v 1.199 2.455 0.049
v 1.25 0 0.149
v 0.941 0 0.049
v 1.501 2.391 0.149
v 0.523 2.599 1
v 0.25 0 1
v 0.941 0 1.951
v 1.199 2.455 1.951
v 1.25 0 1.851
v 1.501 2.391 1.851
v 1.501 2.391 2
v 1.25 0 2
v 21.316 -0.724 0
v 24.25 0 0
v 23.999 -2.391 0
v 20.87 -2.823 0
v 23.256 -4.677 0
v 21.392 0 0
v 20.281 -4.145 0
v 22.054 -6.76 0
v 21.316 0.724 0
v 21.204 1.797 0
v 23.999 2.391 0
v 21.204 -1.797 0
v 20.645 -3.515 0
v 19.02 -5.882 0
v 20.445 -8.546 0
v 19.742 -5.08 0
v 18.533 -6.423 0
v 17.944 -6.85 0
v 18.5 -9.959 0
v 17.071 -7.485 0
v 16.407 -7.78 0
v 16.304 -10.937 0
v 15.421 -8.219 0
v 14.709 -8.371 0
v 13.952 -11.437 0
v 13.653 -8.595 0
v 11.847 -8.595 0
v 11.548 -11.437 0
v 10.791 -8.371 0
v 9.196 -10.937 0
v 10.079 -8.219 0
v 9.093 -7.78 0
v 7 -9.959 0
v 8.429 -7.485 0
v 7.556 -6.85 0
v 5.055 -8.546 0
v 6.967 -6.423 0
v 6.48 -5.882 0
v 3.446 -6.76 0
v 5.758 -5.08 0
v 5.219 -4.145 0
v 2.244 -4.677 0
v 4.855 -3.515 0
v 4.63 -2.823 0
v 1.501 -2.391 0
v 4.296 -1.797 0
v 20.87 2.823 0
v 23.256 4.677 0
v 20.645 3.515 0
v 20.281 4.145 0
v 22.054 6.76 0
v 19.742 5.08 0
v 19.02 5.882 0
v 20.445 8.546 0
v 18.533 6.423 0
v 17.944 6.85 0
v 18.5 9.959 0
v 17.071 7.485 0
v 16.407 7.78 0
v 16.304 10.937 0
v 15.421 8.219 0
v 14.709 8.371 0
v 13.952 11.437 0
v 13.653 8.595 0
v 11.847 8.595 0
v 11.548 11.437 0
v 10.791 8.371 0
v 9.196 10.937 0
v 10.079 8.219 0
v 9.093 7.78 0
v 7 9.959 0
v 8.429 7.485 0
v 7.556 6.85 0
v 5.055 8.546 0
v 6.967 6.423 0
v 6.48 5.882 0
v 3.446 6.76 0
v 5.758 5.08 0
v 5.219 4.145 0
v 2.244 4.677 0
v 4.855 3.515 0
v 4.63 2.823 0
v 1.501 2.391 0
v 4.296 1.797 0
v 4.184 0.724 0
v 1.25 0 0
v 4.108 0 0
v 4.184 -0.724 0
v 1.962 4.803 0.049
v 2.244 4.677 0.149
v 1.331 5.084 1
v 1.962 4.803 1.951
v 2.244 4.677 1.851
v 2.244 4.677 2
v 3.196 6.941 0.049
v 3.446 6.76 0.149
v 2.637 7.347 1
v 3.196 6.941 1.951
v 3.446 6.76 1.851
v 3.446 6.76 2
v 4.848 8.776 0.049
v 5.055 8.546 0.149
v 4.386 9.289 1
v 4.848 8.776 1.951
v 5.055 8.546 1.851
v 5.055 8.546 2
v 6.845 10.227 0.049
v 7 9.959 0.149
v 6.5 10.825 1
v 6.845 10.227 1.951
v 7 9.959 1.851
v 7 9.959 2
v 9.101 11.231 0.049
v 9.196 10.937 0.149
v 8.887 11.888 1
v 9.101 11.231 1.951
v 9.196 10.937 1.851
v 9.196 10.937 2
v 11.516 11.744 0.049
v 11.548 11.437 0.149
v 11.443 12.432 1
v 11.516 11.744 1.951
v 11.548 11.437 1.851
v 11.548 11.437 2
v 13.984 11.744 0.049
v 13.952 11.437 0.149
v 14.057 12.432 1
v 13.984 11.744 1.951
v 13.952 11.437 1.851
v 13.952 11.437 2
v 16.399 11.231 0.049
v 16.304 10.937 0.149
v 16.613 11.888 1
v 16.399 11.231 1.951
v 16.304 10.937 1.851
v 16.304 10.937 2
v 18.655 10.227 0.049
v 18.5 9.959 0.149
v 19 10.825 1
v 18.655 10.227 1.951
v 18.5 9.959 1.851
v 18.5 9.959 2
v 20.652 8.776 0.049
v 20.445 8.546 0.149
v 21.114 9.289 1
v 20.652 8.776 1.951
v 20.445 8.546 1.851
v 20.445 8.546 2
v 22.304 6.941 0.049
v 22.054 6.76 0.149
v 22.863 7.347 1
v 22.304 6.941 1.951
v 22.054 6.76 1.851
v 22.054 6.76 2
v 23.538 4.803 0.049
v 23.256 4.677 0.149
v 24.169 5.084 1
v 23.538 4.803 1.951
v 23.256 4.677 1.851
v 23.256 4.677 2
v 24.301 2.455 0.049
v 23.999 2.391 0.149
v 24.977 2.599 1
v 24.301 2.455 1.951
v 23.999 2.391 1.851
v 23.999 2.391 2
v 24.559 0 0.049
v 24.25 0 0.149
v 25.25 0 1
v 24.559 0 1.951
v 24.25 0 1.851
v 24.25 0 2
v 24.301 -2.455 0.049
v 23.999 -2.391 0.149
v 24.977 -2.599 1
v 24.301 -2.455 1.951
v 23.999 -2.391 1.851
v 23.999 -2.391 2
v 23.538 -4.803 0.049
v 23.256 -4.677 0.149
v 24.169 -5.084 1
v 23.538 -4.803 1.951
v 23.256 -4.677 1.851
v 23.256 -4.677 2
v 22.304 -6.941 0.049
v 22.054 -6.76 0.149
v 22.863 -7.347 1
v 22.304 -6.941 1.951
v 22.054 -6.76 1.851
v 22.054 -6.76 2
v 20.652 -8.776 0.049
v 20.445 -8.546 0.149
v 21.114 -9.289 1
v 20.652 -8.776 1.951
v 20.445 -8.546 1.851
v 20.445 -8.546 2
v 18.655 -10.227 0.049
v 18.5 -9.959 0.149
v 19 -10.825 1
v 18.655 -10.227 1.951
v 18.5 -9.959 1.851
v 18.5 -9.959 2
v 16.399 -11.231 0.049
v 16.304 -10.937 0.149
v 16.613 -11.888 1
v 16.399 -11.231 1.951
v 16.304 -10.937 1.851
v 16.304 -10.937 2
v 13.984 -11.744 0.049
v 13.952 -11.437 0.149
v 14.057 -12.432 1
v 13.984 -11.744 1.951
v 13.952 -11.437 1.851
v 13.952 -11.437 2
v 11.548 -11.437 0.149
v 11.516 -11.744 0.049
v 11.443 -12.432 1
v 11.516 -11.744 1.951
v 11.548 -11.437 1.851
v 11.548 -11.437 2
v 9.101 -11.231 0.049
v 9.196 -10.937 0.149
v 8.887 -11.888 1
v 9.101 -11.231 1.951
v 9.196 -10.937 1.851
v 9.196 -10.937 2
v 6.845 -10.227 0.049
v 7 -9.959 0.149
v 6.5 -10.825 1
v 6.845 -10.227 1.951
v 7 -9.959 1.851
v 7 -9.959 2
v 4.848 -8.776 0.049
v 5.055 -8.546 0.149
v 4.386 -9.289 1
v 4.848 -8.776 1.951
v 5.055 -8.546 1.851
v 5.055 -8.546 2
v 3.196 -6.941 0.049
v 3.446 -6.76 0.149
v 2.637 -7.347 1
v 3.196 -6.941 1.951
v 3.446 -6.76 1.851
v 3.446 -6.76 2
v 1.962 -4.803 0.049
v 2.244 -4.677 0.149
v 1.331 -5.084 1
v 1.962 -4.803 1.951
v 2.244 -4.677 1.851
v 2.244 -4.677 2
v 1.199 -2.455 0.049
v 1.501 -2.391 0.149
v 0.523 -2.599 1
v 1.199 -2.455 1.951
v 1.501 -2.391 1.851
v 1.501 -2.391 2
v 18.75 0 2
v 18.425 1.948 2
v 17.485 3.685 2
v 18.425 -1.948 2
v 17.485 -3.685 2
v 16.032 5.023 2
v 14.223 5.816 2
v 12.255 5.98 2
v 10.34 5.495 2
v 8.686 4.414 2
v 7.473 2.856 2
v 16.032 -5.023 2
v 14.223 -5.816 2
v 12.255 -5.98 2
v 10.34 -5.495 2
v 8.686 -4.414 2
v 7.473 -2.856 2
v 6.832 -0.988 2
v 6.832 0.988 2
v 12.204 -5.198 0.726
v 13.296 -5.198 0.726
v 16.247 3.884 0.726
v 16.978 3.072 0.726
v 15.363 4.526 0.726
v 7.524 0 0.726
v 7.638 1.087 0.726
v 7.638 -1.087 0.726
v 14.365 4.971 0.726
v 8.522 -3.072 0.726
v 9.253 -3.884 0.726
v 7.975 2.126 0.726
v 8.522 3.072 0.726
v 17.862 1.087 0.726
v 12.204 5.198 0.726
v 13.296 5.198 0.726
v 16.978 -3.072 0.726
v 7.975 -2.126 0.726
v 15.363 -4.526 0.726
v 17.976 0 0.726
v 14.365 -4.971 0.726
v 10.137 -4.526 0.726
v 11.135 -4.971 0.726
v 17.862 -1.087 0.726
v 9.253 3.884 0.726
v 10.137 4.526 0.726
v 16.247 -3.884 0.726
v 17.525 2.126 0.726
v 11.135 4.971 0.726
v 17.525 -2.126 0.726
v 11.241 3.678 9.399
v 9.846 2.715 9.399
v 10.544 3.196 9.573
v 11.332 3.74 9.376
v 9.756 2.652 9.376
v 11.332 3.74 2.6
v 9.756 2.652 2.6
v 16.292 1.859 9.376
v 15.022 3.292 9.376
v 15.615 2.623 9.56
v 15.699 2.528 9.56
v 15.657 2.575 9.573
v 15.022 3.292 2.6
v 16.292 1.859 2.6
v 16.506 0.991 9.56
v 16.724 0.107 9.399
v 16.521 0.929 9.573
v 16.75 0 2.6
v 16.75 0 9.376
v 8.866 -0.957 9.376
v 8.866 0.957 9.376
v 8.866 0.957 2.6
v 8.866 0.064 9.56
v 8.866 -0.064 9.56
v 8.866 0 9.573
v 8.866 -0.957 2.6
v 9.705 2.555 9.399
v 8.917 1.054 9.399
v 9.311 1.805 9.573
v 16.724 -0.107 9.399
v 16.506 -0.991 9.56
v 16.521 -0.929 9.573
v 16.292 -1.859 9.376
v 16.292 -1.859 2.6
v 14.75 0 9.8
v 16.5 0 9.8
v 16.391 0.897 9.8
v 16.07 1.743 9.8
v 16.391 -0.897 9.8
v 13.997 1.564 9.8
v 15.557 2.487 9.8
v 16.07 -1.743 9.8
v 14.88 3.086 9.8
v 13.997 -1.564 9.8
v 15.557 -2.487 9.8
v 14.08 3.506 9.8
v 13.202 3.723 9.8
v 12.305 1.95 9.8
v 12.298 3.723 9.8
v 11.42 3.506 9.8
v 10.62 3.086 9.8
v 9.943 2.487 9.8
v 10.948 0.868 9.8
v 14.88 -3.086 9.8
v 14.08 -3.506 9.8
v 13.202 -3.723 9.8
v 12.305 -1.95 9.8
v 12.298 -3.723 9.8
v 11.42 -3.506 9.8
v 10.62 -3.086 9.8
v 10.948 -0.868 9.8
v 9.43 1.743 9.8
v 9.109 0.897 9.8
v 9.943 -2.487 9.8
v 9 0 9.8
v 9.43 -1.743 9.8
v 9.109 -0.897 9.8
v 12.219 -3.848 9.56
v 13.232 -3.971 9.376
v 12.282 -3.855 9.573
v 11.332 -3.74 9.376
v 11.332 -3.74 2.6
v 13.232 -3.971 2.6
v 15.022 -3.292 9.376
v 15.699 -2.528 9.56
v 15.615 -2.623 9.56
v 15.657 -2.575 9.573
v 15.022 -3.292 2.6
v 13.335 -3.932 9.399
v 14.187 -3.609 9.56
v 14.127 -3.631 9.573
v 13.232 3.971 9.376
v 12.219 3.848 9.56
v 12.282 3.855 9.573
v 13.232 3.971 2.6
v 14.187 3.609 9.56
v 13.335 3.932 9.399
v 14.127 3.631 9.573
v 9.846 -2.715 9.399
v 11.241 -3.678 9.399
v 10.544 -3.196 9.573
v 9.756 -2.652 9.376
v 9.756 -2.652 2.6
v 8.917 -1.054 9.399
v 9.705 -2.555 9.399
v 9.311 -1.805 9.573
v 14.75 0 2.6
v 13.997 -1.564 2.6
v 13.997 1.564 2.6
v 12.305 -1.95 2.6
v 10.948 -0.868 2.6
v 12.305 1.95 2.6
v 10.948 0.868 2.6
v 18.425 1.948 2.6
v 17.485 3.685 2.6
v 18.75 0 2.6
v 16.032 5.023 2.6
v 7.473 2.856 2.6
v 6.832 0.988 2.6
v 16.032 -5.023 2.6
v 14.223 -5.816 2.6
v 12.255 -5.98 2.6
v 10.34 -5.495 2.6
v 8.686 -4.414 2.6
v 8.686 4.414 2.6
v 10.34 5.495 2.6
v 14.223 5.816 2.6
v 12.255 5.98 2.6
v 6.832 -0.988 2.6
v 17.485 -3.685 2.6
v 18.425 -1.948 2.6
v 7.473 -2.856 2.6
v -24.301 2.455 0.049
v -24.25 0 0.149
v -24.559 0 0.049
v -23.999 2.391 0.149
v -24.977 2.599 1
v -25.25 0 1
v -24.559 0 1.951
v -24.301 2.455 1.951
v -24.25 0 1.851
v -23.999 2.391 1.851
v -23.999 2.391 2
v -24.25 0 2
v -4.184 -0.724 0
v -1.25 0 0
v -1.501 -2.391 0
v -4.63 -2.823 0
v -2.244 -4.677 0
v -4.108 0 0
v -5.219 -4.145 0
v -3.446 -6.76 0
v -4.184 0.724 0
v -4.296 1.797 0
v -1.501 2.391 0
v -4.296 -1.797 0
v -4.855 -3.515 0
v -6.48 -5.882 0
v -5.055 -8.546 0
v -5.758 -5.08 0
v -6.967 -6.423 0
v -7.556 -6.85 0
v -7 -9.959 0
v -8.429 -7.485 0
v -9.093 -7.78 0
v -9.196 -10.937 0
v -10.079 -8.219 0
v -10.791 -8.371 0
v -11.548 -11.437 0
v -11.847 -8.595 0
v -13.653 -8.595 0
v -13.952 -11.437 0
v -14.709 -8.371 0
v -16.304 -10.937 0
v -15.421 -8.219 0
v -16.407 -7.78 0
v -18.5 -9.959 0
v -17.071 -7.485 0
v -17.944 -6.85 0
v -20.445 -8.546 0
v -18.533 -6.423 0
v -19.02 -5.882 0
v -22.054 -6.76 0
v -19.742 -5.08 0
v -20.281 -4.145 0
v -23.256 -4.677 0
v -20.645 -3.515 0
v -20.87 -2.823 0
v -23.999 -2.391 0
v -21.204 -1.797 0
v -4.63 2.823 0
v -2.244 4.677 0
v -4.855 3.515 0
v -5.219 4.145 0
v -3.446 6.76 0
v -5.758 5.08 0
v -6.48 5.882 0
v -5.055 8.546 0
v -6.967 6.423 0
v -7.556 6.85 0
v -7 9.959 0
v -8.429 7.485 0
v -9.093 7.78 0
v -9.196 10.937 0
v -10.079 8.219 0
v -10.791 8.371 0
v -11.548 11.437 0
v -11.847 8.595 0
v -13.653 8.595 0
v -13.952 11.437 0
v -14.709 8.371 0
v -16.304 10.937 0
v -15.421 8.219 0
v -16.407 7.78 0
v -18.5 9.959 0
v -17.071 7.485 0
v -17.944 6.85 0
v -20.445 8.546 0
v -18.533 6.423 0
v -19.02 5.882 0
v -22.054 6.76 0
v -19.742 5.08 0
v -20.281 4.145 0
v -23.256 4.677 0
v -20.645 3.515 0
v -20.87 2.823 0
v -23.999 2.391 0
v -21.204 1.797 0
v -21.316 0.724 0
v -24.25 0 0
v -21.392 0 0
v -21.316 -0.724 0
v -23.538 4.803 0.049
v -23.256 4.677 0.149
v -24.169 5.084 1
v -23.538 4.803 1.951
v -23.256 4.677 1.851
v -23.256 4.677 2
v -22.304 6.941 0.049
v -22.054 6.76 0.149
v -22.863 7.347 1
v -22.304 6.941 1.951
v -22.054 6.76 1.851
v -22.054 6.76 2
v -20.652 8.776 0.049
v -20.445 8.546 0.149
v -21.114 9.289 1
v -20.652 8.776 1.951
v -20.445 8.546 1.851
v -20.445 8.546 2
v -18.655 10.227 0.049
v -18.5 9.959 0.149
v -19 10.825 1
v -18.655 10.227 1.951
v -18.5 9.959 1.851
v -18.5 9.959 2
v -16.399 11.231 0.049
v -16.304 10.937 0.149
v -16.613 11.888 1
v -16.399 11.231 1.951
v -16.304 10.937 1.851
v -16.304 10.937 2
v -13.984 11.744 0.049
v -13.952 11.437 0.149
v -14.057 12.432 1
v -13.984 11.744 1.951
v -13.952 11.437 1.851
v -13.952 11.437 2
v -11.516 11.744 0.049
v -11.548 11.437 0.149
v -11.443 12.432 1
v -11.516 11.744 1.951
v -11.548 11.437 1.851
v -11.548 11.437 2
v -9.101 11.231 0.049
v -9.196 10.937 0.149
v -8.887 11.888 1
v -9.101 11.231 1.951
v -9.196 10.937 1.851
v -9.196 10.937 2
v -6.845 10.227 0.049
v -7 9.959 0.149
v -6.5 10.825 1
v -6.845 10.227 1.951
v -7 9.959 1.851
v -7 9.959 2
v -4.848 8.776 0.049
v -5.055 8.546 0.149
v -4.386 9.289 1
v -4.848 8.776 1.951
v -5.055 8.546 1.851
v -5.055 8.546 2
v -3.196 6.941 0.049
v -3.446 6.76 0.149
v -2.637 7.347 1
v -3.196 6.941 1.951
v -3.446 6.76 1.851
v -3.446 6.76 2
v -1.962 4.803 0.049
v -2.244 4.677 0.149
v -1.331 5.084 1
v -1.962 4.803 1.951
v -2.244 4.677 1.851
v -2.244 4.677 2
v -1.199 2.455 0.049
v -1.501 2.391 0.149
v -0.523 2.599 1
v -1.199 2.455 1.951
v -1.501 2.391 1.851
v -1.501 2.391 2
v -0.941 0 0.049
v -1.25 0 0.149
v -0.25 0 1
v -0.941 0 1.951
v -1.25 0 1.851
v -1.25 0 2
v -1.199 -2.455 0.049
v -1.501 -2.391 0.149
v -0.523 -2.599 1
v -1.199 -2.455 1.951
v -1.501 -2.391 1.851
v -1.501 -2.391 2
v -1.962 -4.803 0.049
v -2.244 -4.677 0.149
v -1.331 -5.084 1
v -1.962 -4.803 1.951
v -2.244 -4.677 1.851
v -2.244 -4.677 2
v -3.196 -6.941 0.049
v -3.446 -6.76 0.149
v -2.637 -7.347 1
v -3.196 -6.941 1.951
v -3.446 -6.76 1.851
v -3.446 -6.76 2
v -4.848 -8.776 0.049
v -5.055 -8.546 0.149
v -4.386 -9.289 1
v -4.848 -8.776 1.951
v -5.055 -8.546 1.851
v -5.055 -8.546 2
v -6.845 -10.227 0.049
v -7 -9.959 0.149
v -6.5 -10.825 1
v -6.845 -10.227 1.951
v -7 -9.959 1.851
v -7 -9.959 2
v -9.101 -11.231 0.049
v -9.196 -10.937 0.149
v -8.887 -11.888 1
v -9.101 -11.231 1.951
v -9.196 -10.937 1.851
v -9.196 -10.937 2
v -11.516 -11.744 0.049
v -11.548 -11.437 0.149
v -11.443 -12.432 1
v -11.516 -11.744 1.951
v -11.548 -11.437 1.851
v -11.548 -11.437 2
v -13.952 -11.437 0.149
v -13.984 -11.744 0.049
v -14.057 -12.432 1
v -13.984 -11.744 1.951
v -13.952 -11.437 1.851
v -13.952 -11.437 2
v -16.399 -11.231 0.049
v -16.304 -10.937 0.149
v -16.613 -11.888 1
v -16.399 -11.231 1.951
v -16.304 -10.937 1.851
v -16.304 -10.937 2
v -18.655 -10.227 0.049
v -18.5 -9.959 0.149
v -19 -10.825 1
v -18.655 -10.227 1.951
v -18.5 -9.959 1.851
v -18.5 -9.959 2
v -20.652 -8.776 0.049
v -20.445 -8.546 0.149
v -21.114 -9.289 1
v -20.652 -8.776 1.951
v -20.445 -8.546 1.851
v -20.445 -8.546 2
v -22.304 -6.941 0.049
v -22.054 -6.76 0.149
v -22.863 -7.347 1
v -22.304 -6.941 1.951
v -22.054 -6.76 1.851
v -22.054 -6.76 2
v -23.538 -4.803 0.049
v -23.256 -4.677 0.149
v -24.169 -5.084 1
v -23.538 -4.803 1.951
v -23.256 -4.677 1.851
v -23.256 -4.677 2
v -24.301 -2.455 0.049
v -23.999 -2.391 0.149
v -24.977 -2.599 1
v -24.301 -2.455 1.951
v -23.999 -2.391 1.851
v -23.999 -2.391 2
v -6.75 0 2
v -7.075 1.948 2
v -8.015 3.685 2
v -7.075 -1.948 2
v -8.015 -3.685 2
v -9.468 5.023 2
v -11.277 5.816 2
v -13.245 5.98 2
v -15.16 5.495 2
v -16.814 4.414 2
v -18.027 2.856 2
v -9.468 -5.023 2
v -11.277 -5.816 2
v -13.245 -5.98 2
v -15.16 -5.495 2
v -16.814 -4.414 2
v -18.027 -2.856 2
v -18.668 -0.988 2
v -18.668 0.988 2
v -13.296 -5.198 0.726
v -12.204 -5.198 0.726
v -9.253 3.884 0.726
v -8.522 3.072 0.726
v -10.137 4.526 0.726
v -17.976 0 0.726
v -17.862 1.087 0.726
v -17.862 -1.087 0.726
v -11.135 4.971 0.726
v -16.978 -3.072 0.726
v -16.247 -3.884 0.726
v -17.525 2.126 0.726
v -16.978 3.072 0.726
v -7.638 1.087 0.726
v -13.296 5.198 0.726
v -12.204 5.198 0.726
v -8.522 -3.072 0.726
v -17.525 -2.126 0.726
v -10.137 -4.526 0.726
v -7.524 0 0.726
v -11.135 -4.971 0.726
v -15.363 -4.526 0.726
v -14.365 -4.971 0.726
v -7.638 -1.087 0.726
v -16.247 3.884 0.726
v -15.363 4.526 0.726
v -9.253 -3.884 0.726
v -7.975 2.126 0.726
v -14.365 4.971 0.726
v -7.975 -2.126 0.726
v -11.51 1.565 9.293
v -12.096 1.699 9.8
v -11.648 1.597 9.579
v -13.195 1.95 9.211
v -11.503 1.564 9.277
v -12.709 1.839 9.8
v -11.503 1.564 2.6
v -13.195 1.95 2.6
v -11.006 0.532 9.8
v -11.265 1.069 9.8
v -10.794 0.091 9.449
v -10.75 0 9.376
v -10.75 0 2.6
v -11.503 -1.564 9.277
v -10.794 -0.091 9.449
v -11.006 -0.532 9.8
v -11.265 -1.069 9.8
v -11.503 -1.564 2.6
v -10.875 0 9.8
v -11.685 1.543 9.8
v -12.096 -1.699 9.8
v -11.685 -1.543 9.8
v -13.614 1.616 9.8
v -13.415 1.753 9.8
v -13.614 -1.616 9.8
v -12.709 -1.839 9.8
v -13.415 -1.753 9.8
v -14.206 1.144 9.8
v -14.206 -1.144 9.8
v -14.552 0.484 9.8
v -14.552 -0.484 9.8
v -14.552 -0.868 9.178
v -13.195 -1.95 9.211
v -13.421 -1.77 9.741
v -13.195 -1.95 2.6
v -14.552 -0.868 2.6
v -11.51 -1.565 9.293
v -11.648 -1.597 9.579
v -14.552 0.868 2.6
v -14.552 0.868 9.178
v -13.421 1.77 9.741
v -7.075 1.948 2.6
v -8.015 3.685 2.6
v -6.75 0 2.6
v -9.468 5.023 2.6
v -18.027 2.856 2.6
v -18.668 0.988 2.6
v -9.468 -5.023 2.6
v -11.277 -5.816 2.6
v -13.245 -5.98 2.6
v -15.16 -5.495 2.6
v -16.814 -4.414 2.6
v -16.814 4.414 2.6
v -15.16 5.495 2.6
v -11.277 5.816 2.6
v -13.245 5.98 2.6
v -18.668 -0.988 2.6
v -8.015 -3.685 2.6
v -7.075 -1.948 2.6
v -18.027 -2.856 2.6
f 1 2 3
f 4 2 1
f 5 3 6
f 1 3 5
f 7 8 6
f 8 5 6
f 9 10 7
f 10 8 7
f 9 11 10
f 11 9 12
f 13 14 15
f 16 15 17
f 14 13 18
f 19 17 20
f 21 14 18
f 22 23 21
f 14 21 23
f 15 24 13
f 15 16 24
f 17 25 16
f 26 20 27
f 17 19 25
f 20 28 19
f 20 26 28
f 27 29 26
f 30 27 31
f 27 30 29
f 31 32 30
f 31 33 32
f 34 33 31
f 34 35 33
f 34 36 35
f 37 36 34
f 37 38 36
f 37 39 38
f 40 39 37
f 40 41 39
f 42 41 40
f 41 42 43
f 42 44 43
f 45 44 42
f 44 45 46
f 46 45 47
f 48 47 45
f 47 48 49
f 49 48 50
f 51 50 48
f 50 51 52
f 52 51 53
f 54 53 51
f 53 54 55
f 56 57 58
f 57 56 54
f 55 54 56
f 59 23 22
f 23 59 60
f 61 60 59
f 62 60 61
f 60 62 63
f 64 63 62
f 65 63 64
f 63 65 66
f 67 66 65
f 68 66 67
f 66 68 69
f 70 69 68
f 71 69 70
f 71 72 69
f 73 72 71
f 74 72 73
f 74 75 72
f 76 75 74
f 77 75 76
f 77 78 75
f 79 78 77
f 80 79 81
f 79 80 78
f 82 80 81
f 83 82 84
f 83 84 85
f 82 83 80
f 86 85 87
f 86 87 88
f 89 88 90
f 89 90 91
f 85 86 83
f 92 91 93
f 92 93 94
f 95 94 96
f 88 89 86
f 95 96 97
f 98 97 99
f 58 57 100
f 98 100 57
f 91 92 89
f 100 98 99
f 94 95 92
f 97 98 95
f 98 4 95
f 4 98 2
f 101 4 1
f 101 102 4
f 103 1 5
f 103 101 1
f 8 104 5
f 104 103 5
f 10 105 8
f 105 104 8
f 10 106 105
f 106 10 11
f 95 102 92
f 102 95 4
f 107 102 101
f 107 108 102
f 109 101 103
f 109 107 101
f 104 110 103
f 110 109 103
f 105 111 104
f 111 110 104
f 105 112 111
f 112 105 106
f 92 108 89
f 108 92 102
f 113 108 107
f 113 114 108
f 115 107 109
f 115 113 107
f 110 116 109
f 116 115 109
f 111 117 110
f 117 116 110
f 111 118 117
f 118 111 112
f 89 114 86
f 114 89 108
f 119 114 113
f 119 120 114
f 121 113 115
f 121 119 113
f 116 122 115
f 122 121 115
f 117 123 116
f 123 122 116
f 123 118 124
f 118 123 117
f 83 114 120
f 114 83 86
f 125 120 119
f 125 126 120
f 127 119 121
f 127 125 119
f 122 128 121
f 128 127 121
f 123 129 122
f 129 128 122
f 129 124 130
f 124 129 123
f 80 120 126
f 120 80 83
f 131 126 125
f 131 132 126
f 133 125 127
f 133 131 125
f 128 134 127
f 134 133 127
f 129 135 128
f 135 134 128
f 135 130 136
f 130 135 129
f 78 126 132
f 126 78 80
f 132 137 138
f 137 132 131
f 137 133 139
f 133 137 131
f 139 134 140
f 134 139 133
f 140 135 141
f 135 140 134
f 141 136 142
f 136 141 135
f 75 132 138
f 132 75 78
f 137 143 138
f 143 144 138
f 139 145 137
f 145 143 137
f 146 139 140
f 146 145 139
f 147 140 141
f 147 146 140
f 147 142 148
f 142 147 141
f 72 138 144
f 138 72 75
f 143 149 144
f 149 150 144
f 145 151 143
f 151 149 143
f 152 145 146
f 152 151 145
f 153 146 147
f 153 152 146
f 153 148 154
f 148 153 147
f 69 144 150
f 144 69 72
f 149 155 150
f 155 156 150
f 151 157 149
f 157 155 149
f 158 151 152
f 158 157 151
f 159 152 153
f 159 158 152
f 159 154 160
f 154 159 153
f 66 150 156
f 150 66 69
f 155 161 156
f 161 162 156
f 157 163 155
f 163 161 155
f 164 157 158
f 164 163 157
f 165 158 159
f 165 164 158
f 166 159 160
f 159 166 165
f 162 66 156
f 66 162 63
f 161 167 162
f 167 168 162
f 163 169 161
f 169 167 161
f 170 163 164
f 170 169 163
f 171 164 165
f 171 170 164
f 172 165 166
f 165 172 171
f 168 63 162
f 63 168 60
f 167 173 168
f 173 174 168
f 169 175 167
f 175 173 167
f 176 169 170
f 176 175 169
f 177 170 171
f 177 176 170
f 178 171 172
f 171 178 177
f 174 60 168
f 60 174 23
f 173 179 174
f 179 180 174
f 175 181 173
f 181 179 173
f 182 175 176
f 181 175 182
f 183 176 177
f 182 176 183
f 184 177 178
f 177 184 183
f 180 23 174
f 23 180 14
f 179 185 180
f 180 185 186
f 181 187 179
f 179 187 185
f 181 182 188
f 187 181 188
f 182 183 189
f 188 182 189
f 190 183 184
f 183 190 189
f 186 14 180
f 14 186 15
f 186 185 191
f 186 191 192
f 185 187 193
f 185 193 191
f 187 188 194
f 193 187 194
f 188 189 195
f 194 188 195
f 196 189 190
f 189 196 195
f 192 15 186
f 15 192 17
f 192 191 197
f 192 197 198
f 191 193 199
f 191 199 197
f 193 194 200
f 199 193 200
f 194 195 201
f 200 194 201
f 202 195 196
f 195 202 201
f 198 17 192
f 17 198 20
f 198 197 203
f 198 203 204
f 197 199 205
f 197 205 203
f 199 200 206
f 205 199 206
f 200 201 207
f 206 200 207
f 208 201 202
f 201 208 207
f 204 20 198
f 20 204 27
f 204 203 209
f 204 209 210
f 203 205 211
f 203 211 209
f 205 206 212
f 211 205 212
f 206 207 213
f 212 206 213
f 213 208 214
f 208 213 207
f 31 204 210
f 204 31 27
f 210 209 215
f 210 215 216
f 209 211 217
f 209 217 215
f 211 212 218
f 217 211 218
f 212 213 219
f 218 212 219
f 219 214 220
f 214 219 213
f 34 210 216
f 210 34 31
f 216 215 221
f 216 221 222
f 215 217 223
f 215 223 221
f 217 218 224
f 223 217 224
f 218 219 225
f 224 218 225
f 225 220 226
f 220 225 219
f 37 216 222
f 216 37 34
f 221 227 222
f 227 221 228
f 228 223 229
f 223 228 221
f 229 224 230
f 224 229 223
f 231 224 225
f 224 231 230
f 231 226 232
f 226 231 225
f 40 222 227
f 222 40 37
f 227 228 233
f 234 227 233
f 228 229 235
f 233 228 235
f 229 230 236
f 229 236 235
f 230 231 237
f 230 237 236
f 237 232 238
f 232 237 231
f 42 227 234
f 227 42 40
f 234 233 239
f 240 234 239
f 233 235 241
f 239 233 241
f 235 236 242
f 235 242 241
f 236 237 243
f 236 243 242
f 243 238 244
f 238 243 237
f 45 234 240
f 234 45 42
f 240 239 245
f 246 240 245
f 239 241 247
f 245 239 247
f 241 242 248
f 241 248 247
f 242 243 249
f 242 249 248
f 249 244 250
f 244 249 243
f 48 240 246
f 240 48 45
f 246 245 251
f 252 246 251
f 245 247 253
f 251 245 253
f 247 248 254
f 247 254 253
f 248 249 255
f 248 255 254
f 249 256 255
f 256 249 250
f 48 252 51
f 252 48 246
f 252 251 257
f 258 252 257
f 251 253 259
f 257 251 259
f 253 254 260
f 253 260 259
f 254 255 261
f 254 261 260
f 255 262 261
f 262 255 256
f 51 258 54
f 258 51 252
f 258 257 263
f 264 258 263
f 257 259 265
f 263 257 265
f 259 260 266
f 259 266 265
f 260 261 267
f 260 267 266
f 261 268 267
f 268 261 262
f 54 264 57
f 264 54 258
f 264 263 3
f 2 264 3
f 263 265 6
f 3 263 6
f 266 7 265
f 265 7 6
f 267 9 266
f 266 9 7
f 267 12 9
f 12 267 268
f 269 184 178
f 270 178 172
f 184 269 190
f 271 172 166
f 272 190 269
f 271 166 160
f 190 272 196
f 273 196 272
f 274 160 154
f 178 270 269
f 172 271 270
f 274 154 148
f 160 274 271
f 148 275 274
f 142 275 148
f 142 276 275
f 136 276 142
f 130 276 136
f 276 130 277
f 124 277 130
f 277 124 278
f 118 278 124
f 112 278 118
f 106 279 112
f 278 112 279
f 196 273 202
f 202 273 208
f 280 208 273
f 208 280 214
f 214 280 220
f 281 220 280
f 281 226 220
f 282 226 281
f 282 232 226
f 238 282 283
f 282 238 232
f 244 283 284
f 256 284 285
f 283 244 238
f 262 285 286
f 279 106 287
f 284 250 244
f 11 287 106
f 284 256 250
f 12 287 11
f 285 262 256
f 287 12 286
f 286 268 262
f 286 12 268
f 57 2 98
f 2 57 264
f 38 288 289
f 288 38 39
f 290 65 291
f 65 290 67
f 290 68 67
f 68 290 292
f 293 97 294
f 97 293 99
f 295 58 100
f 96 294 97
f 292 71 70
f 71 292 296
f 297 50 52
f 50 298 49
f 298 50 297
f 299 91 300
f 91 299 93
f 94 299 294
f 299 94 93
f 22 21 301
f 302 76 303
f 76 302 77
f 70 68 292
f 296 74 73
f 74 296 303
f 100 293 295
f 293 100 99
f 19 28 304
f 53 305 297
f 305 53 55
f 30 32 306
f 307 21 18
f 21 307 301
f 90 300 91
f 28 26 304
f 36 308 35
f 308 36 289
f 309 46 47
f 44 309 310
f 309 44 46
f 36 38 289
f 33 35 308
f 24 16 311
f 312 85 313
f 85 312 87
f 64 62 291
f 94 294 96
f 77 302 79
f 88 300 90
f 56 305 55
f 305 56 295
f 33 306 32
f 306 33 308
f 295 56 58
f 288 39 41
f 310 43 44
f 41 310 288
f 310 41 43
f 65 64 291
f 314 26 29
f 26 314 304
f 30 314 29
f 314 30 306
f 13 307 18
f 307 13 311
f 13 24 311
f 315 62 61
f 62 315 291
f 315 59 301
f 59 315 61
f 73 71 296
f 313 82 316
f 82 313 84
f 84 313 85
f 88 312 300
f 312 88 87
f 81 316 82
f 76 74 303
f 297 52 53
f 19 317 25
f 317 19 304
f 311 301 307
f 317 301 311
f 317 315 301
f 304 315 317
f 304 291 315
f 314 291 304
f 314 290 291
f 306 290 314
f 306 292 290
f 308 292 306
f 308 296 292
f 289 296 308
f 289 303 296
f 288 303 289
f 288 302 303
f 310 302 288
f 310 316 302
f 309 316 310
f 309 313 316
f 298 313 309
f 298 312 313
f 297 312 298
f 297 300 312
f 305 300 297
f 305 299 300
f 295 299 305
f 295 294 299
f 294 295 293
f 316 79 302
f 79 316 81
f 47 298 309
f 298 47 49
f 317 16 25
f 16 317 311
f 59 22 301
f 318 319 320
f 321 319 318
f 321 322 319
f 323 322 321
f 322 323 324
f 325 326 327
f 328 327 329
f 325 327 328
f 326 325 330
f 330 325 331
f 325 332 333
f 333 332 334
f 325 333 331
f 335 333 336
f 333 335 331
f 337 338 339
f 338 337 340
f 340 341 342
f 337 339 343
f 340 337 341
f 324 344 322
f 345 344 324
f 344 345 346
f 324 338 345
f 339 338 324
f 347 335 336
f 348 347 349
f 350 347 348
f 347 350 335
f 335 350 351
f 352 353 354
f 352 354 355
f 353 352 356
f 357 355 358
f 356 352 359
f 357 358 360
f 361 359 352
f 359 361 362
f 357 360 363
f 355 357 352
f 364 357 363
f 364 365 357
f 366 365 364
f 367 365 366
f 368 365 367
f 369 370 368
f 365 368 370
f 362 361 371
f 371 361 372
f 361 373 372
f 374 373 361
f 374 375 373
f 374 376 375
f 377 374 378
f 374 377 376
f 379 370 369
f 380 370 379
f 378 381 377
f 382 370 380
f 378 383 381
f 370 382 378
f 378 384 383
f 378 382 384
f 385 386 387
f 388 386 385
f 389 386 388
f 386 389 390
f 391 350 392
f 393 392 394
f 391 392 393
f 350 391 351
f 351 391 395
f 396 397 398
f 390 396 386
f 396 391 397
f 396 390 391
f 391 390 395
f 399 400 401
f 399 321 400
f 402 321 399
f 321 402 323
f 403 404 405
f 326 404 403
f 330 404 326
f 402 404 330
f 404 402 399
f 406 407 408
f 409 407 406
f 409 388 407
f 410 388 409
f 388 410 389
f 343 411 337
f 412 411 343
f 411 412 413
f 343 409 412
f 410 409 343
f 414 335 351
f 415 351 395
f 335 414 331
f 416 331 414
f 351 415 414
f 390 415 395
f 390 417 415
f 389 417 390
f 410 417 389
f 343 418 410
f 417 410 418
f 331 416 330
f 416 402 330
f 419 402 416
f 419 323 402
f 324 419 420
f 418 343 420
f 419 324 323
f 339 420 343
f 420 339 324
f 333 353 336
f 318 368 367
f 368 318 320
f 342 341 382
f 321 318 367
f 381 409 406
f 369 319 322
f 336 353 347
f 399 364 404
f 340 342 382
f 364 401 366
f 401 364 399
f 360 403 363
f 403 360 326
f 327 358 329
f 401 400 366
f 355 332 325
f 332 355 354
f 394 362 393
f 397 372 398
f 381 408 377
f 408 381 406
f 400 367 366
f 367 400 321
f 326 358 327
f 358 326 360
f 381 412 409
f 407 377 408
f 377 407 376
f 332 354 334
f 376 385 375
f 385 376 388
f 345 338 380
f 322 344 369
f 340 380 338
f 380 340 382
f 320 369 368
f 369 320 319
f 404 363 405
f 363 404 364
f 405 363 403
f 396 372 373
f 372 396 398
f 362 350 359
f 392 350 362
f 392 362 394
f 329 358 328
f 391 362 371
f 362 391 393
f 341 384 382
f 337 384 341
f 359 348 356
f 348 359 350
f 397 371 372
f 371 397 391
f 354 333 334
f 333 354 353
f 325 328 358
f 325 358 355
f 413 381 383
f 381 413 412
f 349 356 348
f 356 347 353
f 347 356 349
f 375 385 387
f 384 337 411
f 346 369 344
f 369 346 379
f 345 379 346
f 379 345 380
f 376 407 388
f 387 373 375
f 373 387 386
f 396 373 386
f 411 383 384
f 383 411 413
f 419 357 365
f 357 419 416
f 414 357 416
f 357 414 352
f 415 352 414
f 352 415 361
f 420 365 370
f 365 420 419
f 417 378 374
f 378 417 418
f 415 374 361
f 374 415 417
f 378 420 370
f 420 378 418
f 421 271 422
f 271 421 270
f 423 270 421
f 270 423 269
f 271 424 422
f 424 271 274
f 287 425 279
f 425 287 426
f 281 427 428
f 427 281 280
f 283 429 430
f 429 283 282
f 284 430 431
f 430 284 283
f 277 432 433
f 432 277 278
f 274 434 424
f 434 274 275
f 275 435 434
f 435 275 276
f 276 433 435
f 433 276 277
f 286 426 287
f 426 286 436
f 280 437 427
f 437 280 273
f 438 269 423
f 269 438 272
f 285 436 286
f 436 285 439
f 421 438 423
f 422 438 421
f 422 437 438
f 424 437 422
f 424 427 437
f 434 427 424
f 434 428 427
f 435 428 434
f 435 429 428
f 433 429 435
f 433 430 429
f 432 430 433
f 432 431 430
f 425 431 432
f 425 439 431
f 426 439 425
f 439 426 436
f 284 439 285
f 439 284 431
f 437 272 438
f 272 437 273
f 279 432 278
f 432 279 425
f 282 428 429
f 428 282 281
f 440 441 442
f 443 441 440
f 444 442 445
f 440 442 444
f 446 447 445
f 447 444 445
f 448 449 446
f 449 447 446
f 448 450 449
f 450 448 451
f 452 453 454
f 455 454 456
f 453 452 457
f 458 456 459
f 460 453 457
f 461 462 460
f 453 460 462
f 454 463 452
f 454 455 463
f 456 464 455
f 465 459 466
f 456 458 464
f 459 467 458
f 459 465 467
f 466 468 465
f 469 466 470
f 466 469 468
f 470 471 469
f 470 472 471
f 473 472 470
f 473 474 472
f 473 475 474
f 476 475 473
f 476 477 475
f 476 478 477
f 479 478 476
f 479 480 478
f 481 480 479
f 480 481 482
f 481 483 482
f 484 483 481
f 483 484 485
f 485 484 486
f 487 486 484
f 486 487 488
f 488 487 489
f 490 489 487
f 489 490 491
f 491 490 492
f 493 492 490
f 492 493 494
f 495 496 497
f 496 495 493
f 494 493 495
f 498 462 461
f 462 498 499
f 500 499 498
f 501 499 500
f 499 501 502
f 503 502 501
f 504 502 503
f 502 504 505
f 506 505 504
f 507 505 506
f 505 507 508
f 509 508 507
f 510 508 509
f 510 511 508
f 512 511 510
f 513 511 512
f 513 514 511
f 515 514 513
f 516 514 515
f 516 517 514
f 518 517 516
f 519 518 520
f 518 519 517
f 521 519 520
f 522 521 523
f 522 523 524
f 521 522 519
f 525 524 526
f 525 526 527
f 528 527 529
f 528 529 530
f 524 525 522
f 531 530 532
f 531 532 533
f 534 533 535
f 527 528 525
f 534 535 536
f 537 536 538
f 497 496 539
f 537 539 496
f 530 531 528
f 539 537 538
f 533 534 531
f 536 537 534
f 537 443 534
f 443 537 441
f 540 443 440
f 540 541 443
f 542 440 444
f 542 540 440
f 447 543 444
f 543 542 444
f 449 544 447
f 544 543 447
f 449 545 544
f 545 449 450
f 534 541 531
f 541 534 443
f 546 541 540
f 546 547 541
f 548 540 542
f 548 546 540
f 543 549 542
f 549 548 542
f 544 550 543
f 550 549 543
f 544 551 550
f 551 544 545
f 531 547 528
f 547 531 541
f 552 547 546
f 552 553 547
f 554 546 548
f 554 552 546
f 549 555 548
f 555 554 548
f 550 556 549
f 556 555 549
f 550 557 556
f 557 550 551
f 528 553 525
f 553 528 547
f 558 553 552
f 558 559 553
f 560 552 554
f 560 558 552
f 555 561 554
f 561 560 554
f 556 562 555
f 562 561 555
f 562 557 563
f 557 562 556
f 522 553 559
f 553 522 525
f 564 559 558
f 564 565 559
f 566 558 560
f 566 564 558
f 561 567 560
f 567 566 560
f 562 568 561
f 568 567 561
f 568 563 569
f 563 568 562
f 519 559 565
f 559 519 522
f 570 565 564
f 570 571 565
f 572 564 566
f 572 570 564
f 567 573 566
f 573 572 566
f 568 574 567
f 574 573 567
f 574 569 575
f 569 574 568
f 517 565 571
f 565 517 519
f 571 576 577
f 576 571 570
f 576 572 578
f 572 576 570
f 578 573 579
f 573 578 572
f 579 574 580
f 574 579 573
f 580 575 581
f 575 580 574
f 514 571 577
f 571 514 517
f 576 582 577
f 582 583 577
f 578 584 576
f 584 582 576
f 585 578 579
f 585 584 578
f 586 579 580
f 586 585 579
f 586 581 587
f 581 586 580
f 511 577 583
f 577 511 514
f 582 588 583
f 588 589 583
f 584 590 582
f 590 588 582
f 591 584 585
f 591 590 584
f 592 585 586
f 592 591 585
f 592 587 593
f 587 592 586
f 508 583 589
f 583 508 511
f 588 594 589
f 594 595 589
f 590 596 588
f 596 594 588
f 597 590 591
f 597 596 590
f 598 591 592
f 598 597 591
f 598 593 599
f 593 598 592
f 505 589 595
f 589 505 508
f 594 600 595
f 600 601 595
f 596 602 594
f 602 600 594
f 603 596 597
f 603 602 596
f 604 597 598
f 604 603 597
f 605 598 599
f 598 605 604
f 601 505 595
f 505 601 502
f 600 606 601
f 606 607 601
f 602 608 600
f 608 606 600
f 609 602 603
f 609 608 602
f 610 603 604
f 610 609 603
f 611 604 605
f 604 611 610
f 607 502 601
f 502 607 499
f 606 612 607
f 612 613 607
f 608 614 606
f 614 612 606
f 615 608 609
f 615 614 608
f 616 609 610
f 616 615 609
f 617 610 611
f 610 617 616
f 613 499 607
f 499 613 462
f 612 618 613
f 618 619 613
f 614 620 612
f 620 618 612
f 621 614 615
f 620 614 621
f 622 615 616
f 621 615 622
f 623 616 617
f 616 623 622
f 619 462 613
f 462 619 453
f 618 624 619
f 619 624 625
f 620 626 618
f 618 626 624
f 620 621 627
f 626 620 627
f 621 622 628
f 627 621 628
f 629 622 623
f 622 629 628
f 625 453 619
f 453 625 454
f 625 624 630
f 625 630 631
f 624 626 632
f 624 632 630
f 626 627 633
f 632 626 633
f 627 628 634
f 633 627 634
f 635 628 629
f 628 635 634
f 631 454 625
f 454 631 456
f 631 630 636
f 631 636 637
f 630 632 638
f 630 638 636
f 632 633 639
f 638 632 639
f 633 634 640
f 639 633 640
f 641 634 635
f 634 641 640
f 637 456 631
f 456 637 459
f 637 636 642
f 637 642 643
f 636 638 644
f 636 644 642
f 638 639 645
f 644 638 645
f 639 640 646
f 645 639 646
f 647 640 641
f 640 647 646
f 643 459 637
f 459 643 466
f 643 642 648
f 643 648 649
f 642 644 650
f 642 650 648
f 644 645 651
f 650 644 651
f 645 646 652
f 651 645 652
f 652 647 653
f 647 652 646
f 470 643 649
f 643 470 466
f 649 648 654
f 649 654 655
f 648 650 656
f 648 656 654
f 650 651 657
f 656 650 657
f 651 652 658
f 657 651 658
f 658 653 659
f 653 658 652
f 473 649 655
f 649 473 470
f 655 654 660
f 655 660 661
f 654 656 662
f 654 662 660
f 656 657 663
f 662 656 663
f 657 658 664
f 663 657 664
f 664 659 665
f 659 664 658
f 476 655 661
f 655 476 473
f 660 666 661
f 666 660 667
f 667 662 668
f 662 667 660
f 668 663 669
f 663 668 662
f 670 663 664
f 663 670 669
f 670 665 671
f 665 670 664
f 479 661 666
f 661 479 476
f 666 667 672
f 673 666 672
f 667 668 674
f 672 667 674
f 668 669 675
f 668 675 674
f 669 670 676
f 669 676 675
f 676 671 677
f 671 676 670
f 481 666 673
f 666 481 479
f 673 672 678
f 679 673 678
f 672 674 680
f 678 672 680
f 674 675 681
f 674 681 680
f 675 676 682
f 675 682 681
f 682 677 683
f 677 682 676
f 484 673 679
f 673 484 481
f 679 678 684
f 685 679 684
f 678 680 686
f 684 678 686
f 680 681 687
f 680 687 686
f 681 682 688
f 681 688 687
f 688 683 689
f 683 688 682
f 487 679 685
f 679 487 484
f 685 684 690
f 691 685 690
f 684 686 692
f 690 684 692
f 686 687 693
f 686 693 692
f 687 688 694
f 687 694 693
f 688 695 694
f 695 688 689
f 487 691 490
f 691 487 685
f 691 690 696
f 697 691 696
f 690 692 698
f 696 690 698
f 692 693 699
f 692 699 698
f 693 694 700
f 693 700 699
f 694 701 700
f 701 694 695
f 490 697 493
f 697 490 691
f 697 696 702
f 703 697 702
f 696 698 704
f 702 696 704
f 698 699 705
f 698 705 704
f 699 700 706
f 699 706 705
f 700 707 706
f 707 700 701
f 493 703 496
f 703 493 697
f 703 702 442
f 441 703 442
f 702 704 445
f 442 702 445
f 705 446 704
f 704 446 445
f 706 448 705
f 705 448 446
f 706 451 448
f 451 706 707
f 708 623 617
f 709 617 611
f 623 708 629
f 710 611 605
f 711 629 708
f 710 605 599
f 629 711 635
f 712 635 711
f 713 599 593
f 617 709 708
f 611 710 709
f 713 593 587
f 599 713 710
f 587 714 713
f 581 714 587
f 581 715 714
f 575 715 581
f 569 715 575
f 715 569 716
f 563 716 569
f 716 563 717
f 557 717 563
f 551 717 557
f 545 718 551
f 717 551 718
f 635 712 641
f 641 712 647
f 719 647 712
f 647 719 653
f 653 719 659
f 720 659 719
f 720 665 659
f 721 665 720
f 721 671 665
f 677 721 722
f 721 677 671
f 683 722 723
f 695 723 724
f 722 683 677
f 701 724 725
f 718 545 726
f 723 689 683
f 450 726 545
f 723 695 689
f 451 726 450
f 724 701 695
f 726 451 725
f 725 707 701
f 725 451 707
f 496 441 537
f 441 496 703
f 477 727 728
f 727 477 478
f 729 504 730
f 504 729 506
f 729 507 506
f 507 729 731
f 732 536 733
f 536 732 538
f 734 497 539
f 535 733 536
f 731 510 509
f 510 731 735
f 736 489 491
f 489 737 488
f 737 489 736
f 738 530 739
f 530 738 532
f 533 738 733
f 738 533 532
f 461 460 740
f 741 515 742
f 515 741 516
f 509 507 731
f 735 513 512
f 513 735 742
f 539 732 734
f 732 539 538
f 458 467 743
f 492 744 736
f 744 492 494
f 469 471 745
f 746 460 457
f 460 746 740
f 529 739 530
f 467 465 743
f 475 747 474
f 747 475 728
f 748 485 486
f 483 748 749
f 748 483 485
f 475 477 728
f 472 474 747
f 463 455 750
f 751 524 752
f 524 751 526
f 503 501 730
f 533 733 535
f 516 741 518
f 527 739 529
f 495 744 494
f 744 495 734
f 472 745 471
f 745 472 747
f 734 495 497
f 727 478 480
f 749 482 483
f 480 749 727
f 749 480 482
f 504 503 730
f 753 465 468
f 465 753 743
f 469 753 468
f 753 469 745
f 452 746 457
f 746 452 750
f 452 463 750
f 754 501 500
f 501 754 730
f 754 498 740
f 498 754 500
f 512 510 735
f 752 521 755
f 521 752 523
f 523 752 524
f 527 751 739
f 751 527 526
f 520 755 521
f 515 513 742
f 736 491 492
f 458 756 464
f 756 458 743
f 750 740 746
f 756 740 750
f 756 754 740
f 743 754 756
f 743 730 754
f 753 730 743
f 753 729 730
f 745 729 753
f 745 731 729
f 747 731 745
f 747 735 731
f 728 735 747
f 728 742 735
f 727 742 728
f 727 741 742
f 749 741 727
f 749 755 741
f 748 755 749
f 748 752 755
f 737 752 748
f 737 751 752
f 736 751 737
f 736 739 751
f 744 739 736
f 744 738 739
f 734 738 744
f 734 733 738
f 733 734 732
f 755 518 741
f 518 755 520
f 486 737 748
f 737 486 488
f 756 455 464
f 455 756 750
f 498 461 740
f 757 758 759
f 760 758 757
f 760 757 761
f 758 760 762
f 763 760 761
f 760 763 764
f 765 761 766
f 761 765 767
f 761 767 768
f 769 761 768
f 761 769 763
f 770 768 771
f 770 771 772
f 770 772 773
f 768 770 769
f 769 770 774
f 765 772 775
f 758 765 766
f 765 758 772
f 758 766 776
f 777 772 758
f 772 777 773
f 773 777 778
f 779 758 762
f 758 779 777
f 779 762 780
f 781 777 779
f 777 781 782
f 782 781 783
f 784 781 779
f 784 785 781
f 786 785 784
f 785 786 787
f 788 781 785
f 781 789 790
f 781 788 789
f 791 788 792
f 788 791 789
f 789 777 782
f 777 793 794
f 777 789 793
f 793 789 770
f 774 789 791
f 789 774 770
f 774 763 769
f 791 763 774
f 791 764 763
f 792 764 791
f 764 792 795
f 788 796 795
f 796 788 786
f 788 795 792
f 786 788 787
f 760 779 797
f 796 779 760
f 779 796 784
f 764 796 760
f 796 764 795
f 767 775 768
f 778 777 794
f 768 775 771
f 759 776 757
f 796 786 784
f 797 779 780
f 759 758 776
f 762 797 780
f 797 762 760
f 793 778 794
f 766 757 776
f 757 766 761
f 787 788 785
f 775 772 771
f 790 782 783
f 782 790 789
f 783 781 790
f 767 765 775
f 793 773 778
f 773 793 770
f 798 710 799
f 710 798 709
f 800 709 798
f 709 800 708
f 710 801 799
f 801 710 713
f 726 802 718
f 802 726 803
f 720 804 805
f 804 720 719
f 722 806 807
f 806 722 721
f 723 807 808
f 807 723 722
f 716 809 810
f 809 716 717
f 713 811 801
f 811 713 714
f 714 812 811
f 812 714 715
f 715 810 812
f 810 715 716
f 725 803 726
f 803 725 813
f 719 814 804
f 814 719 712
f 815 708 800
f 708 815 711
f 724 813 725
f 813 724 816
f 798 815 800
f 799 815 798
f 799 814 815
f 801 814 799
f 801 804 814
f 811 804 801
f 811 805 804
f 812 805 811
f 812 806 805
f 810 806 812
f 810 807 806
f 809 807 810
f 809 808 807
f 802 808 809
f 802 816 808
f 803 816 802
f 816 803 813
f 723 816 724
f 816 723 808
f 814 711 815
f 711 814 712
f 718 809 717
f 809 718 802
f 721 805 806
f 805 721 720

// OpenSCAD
// $fn=360/2;

edge_radius=1;

grip_diameter=25;
grip_radius=grip_diameter/2;
thumbprint=50;

bushing_diameter=12;
bushing_radius=bushing_diameter/2;
bushing_height=0.6;

bearing_inner_diameter=8;
bearing_inner_radius=bearing_inner_diameter/2;

tab_diameter=bearing_inner_diameter/2;
tab_radius=tab_diameter/2;

post_height=7.2;
bevel_factor=15/16;

module indent() {
  color("yellow") {
    translate([0,0,-thumbprint*0.98]) sphere(r=thumbprint);
  }
}

module grip_disc() {
  difference() {
    rotate_extrude() {
      translate([grip_radius-edge_radius,edge_radius,0]) circle(r=edge_radius);
      square([grip_radius-edge_radius,edge_radius*2]);
    }
    indent();
  }
}

module planes() {
  linear_extrude(height=0.01)  square(size=100, center=true);
  translate([0,0,1]) linear_extrude(height=0.01)  square(size=100, center=true);
}

module bushing () {
  translate([0,0,edge_radius*2])
    cylinder(h=bushing_height, r=bushing_radius);
}

module slot() {
  translate([0,0,bushing_height+edge_radius*2]) {
    difference() {
        intersection() {
            cylinder(h=post_height, r=bearing_inner_radius); // slot
            cylinder(h=post_height, r1=bearing_inner_radius*2, r2=bearing_inner_radius*bevel_factor); // bevel
        }
        cylinder(h=post_height, r=tab_radius); // tab space
    }
  }
}

module tab() {
    translate([0,0,bushing_height+edge_radius*2]) {
        intersection() {
            cylinder(h=post_height, r=tab_radius); // tab
            cylinder(h=post_height, r1=tab_radius*2, r2=tab_radius*bevel_factor); // bevel
        }
    }
}

module upper_grip() {
  grip_disc();  
  bushing();
  slot();
}
translate([grip_diameter*0.51,0,0]) upper_grip();

module lower_grip() {
  grip_disc();  
  bushing();
  tab();
}
translate([-grip_diameter*0.51,0,0]) lower_grip();
